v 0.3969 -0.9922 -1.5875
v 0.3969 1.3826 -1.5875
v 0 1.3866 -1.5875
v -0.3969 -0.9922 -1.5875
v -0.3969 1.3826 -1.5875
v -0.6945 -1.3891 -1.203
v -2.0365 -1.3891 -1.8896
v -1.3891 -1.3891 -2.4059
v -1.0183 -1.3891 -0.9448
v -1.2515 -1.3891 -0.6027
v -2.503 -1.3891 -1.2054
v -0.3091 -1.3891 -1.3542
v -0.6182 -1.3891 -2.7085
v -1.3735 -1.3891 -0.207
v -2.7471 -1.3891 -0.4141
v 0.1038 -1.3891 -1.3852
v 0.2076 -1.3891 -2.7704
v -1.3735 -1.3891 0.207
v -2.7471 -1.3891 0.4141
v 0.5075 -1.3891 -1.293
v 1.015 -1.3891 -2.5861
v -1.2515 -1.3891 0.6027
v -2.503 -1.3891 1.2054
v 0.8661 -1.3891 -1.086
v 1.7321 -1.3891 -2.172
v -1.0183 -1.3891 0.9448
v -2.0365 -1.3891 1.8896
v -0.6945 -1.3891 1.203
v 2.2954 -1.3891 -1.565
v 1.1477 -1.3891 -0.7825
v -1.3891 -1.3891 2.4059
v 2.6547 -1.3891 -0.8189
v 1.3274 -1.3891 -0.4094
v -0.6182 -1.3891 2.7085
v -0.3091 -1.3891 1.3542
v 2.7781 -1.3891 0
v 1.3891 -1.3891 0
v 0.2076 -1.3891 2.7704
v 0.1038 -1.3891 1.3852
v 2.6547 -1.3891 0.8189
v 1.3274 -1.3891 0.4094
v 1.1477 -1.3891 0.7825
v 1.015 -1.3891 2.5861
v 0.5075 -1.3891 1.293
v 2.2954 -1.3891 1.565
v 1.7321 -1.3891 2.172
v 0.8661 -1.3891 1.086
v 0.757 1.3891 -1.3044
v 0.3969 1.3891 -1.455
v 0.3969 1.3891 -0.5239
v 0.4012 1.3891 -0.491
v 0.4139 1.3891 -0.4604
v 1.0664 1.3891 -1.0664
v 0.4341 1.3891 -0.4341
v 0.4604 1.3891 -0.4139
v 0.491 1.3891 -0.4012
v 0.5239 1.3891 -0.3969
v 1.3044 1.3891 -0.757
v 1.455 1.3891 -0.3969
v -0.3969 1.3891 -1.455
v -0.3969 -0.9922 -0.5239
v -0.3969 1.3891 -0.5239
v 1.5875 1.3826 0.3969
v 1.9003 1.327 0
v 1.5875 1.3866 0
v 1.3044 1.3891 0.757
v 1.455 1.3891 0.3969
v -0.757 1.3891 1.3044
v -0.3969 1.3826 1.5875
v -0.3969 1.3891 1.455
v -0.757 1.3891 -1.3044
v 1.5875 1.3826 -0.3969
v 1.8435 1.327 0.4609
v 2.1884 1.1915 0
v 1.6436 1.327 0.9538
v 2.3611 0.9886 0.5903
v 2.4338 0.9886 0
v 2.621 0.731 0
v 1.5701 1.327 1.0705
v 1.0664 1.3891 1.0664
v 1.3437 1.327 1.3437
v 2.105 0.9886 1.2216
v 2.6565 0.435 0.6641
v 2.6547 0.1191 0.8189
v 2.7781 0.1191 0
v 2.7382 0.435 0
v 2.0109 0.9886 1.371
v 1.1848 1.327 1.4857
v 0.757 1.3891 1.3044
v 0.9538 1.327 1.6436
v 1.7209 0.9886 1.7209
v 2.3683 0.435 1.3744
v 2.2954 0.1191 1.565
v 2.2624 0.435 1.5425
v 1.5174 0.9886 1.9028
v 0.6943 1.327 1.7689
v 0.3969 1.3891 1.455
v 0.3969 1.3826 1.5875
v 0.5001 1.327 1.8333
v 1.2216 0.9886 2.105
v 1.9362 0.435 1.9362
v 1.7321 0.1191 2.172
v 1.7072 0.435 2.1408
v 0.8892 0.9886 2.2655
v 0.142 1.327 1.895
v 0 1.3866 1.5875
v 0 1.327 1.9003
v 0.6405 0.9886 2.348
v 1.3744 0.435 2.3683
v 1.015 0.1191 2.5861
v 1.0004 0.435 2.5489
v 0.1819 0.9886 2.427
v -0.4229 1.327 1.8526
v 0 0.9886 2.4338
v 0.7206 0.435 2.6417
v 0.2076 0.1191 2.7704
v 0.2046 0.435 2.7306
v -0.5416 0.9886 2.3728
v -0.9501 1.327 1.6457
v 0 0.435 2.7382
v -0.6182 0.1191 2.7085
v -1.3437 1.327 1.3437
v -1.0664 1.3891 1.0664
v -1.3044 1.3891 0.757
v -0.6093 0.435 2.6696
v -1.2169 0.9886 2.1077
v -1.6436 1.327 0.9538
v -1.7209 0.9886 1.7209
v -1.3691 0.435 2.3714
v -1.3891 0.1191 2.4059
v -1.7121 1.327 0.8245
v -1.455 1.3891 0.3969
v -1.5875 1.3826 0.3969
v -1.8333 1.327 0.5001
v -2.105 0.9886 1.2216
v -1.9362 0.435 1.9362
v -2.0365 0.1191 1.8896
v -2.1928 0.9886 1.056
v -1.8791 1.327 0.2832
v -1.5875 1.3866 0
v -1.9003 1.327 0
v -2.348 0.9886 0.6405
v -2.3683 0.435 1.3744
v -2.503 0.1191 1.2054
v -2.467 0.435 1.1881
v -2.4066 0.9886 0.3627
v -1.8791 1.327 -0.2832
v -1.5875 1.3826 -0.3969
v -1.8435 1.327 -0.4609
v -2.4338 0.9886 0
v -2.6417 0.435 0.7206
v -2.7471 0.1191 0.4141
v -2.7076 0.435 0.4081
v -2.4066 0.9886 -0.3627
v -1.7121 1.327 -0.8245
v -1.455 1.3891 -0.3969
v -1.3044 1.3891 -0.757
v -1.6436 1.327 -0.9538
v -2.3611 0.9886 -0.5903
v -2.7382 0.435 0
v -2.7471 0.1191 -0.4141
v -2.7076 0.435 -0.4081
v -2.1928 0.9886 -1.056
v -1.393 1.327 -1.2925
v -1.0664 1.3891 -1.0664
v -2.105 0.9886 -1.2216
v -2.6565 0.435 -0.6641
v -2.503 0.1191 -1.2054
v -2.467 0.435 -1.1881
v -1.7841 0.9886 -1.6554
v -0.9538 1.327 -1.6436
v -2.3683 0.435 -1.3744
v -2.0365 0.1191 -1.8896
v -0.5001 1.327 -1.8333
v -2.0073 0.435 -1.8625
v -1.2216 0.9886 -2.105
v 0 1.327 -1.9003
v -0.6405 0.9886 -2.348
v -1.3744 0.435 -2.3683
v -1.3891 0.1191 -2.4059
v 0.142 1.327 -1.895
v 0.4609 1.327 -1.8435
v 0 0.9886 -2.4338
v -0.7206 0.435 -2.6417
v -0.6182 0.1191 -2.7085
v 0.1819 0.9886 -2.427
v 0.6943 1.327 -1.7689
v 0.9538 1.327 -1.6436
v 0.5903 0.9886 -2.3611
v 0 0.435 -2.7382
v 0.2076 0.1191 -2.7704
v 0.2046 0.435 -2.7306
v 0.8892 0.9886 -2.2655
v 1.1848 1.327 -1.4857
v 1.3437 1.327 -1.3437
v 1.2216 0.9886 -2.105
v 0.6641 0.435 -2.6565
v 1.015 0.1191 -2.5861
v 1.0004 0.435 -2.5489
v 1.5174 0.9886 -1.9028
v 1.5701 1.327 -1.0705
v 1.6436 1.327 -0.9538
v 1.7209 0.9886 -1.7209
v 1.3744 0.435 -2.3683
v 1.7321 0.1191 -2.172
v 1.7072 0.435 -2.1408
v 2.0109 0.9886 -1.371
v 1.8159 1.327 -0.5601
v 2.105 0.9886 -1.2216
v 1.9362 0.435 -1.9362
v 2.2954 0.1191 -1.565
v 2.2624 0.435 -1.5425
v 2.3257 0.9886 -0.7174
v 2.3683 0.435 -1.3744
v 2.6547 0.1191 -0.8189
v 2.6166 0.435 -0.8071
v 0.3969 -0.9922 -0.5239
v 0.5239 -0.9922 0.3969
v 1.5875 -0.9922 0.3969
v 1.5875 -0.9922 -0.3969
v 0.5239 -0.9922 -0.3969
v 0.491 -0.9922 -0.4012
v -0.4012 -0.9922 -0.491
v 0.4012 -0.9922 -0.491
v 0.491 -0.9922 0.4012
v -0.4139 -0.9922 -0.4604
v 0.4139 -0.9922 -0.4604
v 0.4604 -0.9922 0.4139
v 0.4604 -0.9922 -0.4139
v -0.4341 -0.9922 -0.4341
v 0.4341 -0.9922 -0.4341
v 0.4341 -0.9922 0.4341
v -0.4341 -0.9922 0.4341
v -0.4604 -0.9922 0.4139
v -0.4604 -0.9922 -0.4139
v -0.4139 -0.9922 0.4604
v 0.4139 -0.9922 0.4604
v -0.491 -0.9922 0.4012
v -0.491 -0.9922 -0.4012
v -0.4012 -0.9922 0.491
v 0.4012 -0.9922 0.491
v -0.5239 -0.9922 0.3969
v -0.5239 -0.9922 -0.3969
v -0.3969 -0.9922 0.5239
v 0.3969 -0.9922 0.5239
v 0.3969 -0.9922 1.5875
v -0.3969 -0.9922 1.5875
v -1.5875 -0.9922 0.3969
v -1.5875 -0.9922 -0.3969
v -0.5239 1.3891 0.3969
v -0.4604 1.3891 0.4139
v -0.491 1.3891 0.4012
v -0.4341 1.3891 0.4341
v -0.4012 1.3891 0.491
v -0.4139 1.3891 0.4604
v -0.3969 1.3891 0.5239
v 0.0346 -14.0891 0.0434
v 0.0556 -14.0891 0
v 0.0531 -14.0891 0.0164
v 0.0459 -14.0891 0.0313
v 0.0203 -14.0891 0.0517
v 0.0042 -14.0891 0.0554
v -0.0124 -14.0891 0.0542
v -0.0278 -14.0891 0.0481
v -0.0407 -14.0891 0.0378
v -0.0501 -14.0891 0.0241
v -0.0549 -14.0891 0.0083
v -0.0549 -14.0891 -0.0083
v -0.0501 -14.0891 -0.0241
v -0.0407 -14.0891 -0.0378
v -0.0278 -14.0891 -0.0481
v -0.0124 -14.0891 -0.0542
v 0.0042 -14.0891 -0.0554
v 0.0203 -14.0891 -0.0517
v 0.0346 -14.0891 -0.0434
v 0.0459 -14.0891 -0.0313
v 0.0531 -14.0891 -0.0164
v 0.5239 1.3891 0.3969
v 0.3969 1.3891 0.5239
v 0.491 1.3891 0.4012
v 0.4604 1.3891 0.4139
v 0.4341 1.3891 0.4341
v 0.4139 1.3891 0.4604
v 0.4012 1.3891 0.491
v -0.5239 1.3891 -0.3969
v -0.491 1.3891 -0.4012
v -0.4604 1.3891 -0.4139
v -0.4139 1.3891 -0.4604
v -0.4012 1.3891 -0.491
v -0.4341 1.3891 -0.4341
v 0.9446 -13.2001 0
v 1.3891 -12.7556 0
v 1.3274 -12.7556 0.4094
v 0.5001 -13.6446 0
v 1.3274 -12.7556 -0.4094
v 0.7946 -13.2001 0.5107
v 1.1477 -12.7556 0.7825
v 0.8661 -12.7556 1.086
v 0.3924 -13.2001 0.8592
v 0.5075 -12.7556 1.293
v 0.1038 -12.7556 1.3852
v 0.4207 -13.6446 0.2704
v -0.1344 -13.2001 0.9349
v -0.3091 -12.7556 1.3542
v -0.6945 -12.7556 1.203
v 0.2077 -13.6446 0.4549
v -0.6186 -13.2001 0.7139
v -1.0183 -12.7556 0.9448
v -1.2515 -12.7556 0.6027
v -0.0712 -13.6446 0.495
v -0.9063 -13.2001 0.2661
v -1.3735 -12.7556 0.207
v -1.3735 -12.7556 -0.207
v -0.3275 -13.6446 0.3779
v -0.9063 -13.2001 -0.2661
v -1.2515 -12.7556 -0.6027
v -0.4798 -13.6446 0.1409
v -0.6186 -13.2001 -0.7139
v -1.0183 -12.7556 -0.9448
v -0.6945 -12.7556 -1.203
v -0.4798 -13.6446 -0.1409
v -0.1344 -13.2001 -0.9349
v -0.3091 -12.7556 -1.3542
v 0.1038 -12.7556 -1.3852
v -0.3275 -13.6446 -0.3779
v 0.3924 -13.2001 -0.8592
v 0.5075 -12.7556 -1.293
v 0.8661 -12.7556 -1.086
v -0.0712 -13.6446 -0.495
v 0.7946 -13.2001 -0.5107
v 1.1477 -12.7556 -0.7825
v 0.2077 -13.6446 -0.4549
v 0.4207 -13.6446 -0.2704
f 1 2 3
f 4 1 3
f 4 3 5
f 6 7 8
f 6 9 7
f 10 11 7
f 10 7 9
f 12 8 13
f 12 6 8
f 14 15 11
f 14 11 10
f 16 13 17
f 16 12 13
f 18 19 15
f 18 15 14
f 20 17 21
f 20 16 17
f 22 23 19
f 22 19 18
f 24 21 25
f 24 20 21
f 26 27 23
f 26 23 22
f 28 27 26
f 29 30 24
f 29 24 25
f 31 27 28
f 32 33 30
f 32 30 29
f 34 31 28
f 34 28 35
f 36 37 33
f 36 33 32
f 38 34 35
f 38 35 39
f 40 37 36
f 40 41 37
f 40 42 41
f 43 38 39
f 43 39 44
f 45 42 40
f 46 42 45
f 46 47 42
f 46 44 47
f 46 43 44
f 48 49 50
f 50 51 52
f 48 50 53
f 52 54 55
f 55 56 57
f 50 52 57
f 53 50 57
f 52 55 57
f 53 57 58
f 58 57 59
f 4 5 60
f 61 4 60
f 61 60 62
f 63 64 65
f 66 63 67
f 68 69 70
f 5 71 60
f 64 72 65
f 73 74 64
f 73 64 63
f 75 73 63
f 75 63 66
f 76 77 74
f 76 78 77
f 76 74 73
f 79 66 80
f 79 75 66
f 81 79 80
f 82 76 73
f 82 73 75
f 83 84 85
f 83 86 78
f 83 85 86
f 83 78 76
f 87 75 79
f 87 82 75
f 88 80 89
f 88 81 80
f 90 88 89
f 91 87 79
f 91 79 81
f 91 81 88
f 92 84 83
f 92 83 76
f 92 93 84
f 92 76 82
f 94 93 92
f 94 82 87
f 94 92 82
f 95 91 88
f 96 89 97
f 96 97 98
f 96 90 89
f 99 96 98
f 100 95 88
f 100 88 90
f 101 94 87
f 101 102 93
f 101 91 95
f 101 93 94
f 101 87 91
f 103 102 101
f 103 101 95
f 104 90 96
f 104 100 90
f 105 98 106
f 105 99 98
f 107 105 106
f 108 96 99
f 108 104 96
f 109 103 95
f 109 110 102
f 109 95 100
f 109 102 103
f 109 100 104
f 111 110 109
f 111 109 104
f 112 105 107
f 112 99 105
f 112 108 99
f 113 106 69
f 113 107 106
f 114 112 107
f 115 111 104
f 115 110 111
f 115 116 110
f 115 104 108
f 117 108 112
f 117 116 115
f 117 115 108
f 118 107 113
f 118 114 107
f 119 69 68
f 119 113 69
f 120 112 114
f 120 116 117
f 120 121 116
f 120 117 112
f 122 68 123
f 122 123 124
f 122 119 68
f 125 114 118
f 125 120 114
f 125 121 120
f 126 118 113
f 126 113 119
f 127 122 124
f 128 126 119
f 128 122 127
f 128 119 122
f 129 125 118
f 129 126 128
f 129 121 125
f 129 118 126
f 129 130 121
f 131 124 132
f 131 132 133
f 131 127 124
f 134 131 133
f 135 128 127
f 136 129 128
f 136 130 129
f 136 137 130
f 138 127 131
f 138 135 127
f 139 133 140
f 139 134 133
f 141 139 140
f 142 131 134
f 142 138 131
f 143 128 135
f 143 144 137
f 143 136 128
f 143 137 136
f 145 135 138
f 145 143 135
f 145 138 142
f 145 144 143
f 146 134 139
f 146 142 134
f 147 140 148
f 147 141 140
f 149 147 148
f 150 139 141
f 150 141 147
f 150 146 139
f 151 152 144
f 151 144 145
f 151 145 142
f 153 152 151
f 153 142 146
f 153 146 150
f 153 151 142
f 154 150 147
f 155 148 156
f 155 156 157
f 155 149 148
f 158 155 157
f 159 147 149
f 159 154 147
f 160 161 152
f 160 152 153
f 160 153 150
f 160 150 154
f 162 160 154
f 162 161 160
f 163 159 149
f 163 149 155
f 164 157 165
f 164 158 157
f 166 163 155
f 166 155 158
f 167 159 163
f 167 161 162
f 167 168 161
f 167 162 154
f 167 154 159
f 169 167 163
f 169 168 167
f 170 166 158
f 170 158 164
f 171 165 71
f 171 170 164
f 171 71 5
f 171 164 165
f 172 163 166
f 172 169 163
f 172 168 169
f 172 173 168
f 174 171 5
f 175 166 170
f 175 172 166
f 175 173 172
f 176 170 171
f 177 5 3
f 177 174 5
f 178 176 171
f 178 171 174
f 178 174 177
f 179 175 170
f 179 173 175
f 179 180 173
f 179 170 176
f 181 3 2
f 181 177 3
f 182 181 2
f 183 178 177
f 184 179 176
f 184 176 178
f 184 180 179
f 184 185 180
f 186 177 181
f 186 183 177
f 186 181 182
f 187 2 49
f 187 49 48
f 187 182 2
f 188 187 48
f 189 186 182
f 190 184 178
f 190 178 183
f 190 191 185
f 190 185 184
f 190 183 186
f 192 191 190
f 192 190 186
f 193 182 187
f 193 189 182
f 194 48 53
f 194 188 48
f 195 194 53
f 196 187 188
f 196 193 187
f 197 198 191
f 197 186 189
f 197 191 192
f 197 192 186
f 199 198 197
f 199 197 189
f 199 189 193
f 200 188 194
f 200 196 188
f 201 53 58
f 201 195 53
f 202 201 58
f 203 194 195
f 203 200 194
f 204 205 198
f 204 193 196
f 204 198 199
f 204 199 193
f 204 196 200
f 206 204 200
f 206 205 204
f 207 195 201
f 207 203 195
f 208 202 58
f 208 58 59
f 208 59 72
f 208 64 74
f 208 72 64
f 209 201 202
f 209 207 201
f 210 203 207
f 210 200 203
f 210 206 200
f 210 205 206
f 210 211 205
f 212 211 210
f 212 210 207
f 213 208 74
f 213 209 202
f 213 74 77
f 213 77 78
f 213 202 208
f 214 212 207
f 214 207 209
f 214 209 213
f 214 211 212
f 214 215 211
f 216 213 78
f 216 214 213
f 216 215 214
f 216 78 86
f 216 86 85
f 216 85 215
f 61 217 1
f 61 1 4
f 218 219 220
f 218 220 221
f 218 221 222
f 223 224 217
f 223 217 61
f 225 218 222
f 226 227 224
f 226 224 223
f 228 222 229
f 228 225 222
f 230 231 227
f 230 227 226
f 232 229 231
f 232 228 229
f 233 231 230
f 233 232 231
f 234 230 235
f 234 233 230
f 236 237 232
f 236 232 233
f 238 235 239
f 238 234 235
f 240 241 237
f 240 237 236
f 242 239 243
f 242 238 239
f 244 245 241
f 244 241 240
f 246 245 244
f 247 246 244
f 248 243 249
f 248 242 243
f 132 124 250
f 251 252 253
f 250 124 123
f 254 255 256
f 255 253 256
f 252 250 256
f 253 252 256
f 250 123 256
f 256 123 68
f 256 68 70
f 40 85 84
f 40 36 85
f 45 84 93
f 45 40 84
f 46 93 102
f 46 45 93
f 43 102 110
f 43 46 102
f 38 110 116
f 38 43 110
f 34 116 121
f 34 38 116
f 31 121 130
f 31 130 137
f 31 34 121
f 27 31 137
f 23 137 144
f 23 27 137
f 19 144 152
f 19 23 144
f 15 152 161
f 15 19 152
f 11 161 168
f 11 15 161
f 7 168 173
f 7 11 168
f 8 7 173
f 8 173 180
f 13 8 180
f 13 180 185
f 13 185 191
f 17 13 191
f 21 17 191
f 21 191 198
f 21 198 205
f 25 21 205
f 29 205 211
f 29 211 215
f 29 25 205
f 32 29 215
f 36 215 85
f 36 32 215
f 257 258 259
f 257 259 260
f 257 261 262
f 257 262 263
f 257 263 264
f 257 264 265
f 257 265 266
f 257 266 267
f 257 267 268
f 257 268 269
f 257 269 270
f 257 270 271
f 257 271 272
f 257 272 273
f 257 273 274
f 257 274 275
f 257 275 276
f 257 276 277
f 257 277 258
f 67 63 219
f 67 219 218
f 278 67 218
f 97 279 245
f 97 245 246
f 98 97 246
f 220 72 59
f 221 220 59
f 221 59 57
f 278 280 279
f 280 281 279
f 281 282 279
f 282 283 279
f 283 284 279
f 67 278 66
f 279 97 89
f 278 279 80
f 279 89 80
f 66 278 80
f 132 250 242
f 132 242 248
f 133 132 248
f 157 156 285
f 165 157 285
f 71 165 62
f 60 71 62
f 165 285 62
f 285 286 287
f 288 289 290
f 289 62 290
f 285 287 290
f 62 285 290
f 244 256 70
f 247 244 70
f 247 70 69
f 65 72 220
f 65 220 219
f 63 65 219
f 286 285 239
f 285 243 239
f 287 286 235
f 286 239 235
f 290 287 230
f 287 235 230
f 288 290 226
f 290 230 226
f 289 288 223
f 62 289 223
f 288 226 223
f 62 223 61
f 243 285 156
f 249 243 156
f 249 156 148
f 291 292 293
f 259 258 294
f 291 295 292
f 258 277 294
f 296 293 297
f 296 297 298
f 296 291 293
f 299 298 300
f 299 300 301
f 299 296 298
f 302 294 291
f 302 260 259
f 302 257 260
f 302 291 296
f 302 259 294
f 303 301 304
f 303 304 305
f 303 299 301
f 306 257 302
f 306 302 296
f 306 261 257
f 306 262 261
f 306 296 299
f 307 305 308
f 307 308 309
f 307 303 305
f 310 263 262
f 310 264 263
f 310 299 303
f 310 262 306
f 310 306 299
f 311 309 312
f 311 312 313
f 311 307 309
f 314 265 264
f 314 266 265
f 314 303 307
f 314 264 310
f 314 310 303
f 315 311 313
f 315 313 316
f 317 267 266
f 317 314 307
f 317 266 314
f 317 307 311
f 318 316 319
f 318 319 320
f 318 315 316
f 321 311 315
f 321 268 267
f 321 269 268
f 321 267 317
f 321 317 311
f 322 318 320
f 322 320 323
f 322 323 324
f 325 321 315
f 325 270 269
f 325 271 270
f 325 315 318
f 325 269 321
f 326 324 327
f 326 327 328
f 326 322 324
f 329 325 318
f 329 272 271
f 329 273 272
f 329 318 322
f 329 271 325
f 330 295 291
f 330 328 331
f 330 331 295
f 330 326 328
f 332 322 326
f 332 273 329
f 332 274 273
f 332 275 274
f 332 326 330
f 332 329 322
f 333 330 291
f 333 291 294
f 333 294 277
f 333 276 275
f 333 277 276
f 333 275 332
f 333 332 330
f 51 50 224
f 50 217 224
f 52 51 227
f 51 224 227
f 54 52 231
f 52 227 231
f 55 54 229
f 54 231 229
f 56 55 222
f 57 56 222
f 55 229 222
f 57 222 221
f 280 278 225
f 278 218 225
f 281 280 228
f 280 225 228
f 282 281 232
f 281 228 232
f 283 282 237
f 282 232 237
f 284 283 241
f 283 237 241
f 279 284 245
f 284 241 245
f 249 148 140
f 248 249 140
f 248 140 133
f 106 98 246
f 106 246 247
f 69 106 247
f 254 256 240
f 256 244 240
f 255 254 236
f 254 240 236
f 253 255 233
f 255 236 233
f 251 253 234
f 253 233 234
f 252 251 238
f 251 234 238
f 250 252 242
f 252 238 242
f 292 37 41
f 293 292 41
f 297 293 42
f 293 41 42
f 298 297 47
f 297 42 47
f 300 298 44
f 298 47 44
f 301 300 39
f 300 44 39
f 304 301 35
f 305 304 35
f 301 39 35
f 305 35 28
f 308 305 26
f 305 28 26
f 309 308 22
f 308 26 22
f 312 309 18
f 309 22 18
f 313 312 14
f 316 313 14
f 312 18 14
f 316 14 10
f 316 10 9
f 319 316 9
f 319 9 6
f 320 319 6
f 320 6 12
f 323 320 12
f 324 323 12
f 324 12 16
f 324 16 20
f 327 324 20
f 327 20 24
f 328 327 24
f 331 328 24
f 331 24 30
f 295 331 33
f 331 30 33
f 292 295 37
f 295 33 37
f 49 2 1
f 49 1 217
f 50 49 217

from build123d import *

# Parameters (mm, degrees)
F0_R     = 2.778125
F1_DEPTH = 1.3890625
F2_R     = 1.3890625
F3_DEPTH = 12.7
F4_W     = 0.79375
F4_H     = 3.175
F6_DEPTH = 2.38125
F5_W     = 3.175
F5_H     = 0.79375
F7_DEPTH = 2.38125
F8_R     = 0.127
F10_SIZE = 1.3335


# Not quite as in the source:
# - a fillet or chamfer that OpenCascade refuses, or shapes differently, is made with other operations: its cross-section is extruded or revolved along the edge and cut away or added


with BuildPart() as f1:
    # F0 (on Front) → F1 (new body, symmetric)
    with BuildSketch(Plane.XZ):
        Circle(F0_R)
    extrude(amount=F1_DEPTH, both=True)

    # F2 (on face) → F3 (join)
    with BuildSketch(Plane.XZ.offset(1.3890625)):
        Circle(F2_R)
    extrude(amount=F3_DEPTH)

    # F4 (on face) → F6 (cut)
    with BuildSketch(Plane(origin=(0, 1.3890625, 0), x_dir=(-1, 0, 0), z_dir=(0, 1, 0))):
        Rectangle(F4_W, F4_H)
    extrude(amount=-F6_DEPTH, mode=Mode.SUBTRACT)

    # F5 (on face) → F7 (cut)
    with BuildSketch(Plane(origin=(0, 1.3890625, 0), x_dir=(-1, 0, 0), z_dir=(0, 1, 0))):
        Rectangle(F5_W, F5_H)
    extrude(amount=-F7_DEPTH, mode=Mode.SUBTRACT)

    # F8
    f8_edges = [f1.edges().sort_by_distance(p)[0] for p in [
        (0.396875, 0.198438, 0.396875),
        (-0.396875, 0.198438, 0.396875),
        (-0.396875, 0.198438, -0.396875),
        (0.396875, 0.198438, -0.396875),
    ]]
    fillet(f8_edges, radius=F8_R)

    # F9: fillet of radius 1.27 on 1 edges, made by hand

    # F9_s1 → F9_t2 (revolve, cut)
    with BuildSketch(Plane.XY):
        with BuildLine():
            ThreePointArc((1.508125, 1.3890625), (2.4061506121, 1.0170881121), (2.778125, 0.1190625))
            Line((2.778125, 0.1190625), (2.778125, 1.3890625))
            Line((2.778125, 1.3890625), (1.508125, 1.3890625))
        make_face()
    revolve(axis=Axis((0, 1.3890625, 0), (0, -1, 0)), mode=Mode.SUBTRACT)

    # F10
    f10_edges = [f1.edges().sort_by_distance(p)[0] for p in [
        (-1.389062, -14.089062, 0),
    ]]
    chamfer(f10_edges, length=F10_SIZE)


solid = f1.part
